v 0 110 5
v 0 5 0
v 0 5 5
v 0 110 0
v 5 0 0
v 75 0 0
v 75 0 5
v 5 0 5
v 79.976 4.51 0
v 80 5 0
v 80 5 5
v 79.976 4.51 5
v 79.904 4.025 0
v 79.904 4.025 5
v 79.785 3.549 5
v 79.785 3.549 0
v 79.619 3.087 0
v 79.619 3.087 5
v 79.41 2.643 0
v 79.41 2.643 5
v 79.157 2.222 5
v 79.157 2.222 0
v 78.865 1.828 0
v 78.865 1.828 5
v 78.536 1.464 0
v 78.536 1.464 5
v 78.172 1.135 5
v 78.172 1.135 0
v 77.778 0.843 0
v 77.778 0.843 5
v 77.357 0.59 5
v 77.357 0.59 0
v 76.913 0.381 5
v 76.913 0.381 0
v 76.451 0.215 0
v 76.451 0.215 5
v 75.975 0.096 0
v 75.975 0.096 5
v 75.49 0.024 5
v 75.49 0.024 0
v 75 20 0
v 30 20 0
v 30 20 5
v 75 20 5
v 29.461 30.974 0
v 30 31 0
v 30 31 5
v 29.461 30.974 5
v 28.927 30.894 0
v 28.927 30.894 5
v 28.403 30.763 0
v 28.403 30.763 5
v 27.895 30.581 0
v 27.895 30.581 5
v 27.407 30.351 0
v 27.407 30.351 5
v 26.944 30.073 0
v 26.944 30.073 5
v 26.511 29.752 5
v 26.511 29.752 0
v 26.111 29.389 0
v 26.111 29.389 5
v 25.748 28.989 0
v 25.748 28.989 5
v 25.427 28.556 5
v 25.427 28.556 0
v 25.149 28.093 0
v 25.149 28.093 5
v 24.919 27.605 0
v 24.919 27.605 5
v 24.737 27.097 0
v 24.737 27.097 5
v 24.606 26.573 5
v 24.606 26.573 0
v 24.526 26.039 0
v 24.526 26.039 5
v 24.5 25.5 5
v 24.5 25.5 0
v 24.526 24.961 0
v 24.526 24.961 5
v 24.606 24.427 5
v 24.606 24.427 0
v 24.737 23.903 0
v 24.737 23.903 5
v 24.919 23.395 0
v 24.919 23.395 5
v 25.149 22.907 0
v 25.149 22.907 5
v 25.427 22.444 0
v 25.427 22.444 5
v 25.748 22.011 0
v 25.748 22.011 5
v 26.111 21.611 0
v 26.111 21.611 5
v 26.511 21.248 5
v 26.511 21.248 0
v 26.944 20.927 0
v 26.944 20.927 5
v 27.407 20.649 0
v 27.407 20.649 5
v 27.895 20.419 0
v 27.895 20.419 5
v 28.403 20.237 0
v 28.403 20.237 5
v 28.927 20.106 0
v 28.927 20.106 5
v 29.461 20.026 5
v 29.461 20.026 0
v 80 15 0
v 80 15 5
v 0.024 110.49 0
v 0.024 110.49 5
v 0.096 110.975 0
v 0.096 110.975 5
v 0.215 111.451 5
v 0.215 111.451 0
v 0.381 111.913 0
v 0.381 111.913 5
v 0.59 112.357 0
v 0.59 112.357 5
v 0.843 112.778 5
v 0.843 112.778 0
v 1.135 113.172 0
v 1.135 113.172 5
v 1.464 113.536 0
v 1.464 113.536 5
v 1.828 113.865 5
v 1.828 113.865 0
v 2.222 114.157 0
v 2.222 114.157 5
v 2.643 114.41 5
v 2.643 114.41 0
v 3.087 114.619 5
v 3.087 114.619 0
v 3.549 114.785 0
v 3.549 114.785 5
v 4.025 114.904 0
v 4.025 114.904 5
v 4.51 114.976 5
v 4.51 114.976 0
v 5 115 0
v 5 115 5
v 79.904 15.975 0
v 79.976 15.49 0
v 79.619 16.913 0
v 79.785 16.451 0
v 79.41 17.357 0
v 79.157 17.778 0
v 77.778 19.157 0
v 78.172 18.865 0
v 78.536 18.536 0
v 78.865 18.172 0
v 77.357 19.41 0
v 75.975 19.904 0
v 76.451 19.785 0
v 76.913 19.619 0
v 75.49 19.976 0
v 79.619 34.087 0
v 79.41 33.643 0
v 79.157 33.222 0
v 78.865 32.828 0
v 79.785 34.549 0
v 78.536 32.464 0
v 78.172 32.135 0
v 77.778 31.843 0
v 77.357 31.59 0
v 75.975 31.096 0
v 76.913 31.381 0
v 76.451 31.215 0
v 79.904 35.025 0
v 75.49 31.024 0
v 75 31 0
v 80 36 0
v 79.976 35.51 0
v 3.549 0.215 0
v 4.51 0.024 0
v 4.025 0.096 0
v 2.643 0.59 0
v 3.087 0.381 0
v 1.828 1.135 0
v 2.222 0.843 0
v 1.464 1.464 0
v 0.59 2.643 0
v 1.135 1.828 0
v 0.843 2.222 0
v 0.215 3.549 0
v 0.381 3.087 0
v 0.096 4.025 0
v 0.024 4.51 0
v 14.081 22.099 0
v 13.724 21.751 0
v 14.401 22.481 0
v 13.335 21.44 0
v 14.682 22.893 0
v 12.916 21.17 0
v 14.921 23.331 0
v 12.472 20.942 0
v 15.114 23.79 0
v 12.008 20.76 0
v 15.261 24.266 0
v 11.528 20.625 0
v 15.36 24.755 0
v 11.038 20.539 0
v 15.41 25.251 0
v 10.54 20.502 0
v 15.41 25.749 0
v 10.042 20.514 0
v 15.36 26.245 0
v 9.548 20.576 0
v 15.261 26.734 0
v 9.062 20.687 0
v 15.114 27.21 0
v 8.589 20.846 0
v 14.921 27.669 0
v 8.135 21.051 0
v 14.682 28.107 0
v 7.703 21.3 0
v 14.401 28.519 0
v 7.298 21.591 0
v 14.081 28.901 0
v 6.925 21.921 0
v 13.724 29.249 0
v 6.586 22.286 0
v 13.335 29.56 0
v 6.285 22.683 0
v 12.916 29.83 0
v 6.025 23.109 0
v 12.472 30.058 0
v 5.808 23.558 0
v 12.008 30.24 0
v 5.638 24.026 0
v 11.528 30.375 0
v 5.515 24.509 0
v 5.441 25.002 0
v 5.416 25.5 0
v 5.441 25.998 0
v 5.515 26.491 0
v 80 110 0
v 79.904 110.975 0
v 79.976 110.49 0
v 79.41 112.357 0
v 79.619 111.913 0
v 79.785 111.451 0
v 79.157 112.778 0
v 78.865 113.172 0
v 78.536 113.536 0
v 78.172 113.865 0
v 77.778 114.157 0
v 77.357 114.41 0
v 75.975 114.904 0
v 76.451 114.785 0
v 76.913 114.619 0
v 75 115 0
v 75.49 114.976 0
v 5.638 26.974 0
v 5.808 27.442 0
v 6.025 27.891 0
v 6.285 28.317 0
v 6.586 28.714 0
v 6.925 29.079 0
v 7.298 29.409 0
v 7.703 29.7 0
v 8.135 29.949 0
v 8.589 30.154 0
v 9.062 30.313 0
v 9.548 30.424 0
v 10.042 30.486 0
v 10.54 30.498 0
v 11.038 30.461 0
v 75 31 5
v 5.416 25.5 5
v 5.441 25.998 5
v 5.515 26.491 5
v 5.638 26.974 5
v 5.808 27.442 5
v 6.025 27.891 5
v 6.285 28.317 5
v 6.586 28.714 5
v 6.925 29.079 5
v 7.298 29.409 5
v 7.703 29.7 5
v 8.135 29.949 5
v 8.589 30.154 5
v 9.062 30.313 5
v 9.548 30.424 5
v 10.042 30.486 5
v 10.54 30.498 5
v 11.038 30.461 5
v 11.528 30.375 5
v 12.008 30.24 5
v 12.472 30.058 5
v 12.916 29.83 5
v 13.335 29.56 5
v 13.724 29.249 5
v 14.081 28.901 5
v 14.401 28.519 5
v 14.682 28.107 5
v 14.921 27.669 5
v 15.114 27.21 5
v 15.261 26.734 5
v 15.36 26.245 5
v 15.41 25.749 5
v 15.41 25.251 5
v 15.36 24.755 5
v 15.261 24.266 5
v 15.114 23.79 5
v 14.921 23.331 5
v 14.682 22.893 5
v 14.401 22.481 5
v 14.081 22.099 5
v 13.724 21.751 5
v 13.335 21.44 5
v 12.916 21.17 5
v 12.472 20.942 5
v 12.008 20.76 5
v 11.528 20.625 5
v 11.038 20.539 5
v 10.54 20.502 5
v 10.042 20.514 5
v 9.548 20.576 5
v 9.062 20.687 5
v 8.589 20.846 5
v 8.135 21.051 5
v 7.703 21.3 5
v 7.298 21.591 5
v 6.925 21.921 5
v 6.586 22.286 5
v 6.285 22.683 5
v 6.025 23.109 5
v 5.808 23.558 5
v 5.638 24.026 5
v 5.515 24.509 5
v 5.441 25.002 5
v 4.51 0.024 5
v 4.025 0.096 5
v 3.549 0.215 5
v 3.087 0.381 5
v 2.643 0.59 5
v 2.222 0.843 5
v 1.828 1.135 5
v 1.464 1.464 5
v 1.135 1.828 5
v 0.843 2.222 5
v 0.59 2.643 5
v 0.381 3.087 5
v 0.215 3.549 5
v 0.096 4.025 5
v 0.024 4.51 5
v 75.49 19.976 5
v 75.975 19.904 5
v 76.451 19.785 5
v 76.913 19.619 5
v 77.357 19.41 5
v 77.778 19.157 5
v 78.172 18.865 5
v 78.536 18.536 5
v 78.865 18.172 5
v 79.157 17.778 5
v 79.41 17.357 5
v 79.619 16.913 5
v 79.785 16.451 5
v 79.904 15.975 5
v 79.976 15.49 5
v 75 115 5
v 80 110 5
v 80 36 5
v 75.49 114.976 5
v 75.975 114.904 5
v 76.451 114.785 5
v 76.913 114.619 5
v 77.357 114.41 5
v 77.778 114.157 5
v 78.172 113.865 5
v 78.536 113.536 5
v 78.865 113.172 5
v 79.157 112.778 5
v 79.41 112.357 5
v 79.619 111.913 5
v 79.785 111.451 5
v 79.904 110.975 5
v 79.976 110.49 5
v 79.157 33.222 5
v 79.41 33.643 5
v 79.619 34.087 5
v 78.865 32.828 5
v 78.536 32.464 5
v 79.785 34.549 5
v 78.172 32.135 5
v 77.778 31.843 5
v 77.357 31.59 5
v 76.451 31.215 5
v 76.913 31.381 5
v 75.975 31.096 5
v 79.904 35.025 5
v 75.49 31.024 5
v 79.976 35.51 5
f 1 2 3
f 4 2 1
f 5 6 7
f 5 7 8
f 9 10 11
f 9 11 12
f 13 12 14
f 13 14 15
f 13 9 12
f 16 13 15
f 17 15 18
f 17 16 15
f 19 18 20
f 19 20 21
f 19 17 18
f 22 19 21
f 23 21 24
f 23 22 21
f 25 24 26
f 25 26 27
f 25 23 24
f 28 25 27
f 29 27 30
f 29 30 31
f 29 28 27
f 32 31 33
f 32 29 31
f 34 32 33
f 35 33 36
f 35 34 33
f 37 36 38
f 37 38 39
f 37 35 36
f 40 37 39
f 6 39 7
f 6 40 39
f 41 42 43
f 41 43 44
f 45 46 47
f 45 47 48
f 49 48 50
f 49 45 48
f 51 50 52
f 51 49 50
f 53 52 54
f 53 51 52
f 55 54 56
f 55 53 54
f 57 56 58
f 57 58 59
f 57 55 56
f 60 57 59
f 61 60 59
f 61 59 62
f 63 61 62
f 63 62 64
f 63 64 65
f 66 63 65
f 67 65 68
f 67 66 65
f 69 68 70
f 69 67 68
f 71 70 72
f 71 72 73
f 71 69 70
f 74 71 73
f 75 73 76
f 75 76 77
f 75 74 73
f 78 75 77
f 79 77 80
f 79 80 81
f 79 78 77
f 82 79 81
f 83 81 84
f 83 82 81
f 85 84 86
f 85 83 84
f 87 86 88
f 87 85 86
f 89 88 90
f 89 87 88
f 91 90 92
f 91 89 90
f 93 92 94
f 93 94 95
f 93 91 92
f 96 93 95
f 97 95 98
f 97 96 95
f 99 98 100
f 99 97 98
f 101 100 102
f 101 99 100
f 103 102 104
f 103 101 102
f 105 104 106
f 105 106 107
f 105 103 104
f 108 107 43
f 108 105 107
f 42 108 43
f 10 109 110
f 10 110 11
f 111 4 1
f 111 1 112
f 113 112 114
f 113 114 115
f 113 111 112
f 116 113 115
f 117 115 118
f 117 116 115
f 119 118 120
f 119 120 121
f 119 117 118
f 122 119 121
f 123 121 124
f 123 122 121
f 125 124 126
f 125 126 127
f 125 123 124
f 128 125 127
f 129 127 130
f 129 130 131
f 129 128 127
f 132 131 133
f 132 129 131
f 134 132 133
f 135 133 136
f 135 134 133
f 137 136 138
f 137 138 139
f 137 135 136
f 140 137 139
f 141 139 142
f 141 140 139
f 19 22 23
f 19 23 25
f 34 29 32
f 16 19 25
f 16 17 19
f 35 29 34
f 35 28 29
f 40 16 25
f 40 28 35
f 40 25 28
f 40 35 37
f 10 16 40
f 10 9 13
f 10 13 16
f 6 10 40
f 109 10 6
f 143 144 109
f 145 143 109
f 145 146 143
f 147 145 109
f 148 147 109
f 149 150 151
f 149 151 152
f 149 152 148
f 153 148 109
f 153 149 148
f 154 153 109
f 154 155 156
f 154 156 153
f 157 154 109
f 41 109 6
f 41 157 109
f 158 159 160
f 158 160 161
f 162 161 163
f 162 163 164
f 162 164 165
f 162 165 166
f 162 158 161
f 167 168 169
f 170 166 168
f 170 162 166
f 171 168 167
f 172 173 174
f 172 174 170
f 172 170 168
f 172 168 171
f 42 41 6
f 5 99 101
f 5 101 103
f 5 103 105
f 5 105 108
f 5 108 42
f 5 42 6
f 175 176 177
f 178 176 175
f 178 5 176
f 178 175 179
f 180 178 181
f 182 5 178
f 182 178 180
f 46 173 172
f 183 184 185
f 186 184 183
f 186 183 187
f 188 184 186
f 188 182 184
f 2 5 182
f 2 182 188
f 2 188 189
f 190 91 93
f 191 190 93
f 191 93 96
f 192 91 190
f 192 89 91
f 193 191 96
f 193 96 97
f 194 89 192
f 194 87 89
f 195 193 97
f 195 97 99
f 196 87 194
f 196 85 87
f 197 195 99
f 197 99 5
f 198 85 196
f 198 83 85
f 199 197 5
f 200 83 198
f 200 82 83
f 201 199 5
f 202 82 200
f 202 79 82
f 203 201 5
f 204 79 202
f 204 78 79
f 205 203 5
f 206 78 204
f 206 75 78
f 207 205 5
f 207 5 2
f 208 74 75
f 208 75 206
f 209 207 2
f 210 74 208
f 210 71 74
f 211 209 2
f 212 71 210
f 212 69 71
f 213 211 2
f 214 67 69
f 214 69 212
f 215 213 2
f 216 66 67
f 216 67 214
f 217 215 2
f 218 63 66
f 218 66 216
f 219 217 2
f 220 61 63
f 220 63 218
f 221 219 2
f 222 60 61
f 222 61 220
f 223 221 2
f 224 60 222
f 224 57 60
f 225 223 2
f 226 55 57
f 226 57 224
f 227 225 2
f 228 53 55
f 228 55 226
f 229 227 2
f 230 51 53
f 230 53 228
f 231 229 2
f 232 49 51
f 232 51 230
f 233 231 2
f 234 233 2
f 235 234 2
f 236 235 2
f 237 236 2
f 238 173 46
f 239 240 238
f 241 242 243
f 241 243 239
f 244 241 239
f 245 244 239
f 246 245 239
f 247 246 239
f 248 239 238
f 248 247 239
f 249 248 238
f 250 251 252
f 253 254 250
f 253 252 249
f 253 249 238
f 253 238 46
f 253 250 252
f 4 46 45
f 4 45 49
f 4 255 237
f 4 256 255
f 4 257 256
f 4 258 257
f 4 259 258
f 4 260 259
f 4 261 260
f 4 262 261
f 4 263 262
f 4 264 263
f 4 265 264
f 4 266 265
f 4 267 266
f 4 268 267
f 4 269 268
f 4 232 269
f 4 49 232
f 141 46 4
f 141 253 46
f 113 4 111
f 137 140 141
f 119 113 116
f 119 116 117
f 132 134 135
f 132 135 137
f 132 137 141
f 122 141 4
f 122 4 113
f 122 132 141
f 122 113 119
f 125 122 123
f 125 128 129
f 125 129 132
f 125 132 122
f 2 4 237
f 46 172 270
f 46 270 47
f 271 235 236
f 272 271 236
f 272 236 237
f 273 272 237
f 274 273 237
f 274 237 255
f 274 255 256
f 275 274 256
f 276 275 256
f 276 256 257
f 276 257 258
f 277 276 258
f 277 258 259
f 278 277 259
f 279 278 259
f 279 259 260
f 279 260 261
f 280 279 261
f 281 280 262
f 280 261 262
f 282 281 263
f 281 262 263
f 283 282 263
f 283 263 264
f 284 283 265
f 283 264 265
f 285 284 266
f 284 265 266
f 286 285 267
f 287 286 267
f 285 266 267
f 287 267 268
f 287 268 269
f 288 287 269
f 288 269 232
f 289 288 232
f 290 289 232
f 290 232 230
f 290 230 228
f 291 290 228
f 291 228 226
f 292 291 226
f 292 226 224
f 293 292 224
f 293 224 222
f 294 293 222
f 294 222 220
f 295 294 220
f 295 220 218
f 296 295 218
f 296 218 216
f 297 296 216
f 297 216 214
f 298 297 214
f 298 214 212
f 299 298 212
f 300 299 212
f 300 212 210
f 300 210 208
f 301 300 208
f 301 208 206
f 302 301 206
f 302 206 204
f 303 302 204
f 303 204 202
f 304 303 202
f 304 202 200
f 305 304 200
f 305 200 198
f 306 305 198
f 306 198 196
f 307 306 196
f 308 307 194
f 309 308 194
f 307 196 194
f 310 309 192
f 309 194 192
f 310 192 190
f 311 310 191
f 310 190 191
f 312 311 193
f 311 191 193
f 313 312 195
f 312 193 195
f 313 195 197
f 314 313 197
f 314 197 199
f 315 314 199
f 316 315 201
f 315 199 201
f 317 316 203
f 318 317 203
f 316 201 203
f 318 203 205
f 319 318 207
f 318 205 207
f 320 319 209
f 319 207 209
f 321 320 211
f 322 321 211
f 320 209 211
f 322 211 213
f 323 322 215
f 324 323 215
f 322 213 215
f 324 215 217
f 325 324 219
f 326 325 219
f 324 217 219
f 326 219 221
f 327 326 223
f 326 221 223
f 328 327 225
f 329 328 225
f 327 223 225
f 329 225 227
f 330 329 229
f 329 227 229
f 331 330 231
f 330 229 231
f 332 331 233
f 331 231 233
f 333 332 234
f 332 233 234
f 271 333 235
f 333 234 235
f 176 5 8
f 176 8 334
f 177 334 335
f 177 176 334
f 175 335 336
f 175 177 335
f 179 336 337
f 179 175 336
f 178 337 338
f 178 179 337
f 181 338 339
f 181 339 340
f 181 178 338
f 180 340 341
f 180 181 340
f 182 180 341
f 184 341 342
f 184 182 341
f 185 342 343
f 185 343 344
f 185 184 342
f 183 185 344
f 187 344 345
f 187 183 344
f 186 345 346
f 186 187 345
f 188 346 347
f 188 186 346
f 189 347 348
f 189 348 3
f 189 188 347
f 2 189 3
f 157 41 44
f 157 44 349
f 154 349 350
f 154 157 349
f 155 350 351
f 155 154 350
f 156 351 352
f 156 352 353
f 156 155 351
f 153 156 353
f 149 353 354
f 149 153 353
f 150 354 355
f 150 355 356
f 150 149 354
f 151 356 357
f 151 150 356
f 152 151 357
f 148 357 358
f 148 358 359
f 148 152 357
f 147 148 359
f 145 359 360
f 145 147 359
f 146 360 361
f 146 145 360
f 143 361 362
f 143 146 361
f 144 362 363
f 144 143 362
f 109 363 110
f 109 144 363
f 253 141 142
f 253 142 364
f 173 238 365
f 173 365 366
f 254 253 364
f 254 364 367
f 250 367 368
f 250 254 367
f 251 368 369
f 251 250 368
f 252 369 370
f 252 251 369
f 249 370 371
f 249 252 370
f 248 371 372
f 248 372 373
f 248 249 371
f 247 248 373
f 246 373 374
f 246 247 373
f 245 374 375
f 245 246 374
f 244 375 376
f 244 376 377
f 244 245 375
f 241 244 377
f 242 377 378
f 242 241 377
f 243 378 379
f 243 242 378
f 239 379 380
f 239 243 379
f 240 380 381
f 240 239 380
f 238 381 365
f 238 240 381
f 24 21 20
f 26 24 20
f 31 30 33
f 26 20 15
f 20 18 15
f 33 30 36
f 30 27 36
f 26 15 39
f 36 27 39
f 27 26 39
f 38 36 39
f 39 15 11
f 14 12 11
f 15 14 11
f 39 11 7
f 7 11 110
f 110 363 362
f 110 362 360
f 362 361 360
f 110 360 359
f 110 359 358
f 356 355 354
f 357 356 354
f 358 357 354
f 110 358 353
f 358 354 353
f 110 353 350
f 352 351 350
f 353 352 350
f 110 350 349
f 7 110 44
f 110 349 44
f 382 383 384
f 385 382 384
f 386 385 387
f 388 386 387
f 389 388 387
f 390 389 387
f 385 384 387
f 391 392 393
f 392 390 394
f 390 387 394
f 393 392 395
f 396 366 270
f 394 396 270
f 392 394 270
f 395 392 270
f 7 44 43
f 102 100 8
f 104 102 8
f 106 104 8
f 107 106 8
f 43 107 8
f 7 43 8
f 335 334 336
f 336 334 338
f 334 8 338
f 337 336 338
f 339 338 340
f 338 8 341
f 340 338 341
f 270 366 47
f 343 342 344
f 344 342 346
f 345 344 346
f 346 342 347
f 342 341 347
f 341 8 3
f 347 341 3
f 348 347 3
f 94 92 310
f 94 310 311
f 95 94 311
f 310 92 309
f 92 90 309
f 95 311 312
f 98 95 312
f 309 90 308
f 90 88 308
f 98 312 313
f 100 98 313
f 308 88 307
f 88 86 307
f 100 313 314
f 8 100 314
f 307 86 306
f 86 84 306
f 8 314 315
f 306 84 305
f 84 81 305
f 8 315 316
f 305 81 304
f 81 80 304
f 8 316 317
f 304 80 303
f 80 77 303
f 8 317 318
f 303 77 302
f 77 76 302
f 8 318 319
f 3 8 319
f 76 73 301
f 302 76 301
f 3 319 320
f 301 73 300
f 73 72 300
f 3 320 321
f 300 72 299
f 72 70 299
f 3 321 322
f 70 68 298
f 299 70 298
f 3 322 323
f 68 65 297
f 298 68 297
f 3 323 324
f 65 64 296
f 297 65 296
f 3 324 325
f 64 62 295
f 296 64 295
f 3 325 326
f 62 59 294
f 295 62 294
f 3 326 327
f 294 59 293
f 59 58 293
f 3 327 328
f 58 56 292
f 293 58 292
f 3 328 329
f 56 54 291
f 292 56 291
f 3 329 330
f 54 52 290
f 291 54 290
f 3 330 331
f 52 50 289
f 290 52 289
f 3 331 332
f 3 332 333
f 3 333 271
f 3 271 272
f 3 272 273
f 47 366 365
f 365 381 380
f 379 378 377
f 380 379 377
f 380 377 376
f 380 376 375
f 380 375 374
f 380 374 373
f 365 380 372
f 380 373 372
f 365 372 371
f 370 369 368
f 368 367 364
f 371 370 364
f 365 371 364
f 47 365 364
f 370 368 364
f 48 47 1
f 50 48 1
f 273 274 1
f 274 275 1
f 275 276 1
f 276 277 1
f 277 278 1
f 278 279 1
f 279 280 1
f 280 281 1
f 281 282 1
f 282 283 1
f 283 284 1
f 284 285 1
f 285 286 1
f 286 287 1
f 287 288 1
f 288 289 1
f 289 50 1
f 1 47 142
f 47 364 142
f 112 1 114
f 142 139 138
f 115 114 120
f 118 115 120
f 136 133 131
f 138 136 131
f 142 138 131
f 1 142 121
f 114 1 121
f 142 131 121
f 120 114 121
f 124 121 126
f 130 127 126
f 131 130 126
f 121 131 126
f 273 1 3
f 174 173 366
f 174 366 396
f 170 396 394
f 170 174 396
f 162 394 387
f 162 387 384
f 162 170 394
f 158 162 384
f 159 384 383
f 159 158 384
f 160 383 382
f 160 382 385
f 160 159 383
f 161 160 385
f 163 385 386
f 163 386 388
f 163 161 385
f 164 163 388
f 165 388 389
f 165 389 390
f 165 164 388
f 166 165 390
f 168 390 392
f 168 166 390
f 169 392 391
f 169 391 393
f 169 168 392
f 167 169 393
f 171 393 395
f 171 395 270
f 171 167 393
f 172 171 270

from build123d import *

# Parameters (mm, degrees)
BOSS_EXTRU_1_DEPTH      = 5
ESQUISSE3_R             = 5
ENL_V_MAT_EXTRU_1_DEPTH = 10


with BuildPart() as part:
    # Esquisse1 → Boss.-Extru.1 (new body)
    with BuildSketch(Plane.XY):
        with BuildLine():
            Line((80, 110), (80, 36))
            ThreePointArc((80, 36), (78.535533906, 32.464466094), (75, 31))
            Line((75, 31), (30, 31))
            ThreePointArc((30, 31), (24.5, 25.5), (30, 20))
            Line((30, 20), (75, 20))
            ThreePointArc((75, 20), (78.535533906, 18.535533906), (80, 15))
            Line((80, 15), (80, 5))
            ThreePointArc((80, 5), (78.535533906, 1.464466094), (75, 0))
            Line((75, 0), (5, 0))
            ThreePointArc((5, 0), (1.464466094, 1.464466094), (0, 5))
            Line((0, 5), (0, 110))
            ThreePointArc((0, 110), (1.464466094, 113.535533906), (5, 115))
            Line((5, 115), (75, 115))
            ThreePointArc((75, 115), (78.535533906, 113.535533906), (80, 110))
        make_face()
    extrude(amount=BOSS_EXTRU_1_DEPTH)

    # Esquisse3 → Enlèv. mat.-Extru.1 (cut)
    with BuildSketch(Plane(origin=(0, 0, 0), x_dir=(-1, 0, 0), z_dir=(0, 0, -1))):
        with Locations((-10.415827114, 25.5)):
            Circle(ESQUISSE3_R)
    extrude(amount=-ENL_V_MAT_EXTRU_1_DEPTH, mode=Mode.SUBTRACT)


solid = part.part
